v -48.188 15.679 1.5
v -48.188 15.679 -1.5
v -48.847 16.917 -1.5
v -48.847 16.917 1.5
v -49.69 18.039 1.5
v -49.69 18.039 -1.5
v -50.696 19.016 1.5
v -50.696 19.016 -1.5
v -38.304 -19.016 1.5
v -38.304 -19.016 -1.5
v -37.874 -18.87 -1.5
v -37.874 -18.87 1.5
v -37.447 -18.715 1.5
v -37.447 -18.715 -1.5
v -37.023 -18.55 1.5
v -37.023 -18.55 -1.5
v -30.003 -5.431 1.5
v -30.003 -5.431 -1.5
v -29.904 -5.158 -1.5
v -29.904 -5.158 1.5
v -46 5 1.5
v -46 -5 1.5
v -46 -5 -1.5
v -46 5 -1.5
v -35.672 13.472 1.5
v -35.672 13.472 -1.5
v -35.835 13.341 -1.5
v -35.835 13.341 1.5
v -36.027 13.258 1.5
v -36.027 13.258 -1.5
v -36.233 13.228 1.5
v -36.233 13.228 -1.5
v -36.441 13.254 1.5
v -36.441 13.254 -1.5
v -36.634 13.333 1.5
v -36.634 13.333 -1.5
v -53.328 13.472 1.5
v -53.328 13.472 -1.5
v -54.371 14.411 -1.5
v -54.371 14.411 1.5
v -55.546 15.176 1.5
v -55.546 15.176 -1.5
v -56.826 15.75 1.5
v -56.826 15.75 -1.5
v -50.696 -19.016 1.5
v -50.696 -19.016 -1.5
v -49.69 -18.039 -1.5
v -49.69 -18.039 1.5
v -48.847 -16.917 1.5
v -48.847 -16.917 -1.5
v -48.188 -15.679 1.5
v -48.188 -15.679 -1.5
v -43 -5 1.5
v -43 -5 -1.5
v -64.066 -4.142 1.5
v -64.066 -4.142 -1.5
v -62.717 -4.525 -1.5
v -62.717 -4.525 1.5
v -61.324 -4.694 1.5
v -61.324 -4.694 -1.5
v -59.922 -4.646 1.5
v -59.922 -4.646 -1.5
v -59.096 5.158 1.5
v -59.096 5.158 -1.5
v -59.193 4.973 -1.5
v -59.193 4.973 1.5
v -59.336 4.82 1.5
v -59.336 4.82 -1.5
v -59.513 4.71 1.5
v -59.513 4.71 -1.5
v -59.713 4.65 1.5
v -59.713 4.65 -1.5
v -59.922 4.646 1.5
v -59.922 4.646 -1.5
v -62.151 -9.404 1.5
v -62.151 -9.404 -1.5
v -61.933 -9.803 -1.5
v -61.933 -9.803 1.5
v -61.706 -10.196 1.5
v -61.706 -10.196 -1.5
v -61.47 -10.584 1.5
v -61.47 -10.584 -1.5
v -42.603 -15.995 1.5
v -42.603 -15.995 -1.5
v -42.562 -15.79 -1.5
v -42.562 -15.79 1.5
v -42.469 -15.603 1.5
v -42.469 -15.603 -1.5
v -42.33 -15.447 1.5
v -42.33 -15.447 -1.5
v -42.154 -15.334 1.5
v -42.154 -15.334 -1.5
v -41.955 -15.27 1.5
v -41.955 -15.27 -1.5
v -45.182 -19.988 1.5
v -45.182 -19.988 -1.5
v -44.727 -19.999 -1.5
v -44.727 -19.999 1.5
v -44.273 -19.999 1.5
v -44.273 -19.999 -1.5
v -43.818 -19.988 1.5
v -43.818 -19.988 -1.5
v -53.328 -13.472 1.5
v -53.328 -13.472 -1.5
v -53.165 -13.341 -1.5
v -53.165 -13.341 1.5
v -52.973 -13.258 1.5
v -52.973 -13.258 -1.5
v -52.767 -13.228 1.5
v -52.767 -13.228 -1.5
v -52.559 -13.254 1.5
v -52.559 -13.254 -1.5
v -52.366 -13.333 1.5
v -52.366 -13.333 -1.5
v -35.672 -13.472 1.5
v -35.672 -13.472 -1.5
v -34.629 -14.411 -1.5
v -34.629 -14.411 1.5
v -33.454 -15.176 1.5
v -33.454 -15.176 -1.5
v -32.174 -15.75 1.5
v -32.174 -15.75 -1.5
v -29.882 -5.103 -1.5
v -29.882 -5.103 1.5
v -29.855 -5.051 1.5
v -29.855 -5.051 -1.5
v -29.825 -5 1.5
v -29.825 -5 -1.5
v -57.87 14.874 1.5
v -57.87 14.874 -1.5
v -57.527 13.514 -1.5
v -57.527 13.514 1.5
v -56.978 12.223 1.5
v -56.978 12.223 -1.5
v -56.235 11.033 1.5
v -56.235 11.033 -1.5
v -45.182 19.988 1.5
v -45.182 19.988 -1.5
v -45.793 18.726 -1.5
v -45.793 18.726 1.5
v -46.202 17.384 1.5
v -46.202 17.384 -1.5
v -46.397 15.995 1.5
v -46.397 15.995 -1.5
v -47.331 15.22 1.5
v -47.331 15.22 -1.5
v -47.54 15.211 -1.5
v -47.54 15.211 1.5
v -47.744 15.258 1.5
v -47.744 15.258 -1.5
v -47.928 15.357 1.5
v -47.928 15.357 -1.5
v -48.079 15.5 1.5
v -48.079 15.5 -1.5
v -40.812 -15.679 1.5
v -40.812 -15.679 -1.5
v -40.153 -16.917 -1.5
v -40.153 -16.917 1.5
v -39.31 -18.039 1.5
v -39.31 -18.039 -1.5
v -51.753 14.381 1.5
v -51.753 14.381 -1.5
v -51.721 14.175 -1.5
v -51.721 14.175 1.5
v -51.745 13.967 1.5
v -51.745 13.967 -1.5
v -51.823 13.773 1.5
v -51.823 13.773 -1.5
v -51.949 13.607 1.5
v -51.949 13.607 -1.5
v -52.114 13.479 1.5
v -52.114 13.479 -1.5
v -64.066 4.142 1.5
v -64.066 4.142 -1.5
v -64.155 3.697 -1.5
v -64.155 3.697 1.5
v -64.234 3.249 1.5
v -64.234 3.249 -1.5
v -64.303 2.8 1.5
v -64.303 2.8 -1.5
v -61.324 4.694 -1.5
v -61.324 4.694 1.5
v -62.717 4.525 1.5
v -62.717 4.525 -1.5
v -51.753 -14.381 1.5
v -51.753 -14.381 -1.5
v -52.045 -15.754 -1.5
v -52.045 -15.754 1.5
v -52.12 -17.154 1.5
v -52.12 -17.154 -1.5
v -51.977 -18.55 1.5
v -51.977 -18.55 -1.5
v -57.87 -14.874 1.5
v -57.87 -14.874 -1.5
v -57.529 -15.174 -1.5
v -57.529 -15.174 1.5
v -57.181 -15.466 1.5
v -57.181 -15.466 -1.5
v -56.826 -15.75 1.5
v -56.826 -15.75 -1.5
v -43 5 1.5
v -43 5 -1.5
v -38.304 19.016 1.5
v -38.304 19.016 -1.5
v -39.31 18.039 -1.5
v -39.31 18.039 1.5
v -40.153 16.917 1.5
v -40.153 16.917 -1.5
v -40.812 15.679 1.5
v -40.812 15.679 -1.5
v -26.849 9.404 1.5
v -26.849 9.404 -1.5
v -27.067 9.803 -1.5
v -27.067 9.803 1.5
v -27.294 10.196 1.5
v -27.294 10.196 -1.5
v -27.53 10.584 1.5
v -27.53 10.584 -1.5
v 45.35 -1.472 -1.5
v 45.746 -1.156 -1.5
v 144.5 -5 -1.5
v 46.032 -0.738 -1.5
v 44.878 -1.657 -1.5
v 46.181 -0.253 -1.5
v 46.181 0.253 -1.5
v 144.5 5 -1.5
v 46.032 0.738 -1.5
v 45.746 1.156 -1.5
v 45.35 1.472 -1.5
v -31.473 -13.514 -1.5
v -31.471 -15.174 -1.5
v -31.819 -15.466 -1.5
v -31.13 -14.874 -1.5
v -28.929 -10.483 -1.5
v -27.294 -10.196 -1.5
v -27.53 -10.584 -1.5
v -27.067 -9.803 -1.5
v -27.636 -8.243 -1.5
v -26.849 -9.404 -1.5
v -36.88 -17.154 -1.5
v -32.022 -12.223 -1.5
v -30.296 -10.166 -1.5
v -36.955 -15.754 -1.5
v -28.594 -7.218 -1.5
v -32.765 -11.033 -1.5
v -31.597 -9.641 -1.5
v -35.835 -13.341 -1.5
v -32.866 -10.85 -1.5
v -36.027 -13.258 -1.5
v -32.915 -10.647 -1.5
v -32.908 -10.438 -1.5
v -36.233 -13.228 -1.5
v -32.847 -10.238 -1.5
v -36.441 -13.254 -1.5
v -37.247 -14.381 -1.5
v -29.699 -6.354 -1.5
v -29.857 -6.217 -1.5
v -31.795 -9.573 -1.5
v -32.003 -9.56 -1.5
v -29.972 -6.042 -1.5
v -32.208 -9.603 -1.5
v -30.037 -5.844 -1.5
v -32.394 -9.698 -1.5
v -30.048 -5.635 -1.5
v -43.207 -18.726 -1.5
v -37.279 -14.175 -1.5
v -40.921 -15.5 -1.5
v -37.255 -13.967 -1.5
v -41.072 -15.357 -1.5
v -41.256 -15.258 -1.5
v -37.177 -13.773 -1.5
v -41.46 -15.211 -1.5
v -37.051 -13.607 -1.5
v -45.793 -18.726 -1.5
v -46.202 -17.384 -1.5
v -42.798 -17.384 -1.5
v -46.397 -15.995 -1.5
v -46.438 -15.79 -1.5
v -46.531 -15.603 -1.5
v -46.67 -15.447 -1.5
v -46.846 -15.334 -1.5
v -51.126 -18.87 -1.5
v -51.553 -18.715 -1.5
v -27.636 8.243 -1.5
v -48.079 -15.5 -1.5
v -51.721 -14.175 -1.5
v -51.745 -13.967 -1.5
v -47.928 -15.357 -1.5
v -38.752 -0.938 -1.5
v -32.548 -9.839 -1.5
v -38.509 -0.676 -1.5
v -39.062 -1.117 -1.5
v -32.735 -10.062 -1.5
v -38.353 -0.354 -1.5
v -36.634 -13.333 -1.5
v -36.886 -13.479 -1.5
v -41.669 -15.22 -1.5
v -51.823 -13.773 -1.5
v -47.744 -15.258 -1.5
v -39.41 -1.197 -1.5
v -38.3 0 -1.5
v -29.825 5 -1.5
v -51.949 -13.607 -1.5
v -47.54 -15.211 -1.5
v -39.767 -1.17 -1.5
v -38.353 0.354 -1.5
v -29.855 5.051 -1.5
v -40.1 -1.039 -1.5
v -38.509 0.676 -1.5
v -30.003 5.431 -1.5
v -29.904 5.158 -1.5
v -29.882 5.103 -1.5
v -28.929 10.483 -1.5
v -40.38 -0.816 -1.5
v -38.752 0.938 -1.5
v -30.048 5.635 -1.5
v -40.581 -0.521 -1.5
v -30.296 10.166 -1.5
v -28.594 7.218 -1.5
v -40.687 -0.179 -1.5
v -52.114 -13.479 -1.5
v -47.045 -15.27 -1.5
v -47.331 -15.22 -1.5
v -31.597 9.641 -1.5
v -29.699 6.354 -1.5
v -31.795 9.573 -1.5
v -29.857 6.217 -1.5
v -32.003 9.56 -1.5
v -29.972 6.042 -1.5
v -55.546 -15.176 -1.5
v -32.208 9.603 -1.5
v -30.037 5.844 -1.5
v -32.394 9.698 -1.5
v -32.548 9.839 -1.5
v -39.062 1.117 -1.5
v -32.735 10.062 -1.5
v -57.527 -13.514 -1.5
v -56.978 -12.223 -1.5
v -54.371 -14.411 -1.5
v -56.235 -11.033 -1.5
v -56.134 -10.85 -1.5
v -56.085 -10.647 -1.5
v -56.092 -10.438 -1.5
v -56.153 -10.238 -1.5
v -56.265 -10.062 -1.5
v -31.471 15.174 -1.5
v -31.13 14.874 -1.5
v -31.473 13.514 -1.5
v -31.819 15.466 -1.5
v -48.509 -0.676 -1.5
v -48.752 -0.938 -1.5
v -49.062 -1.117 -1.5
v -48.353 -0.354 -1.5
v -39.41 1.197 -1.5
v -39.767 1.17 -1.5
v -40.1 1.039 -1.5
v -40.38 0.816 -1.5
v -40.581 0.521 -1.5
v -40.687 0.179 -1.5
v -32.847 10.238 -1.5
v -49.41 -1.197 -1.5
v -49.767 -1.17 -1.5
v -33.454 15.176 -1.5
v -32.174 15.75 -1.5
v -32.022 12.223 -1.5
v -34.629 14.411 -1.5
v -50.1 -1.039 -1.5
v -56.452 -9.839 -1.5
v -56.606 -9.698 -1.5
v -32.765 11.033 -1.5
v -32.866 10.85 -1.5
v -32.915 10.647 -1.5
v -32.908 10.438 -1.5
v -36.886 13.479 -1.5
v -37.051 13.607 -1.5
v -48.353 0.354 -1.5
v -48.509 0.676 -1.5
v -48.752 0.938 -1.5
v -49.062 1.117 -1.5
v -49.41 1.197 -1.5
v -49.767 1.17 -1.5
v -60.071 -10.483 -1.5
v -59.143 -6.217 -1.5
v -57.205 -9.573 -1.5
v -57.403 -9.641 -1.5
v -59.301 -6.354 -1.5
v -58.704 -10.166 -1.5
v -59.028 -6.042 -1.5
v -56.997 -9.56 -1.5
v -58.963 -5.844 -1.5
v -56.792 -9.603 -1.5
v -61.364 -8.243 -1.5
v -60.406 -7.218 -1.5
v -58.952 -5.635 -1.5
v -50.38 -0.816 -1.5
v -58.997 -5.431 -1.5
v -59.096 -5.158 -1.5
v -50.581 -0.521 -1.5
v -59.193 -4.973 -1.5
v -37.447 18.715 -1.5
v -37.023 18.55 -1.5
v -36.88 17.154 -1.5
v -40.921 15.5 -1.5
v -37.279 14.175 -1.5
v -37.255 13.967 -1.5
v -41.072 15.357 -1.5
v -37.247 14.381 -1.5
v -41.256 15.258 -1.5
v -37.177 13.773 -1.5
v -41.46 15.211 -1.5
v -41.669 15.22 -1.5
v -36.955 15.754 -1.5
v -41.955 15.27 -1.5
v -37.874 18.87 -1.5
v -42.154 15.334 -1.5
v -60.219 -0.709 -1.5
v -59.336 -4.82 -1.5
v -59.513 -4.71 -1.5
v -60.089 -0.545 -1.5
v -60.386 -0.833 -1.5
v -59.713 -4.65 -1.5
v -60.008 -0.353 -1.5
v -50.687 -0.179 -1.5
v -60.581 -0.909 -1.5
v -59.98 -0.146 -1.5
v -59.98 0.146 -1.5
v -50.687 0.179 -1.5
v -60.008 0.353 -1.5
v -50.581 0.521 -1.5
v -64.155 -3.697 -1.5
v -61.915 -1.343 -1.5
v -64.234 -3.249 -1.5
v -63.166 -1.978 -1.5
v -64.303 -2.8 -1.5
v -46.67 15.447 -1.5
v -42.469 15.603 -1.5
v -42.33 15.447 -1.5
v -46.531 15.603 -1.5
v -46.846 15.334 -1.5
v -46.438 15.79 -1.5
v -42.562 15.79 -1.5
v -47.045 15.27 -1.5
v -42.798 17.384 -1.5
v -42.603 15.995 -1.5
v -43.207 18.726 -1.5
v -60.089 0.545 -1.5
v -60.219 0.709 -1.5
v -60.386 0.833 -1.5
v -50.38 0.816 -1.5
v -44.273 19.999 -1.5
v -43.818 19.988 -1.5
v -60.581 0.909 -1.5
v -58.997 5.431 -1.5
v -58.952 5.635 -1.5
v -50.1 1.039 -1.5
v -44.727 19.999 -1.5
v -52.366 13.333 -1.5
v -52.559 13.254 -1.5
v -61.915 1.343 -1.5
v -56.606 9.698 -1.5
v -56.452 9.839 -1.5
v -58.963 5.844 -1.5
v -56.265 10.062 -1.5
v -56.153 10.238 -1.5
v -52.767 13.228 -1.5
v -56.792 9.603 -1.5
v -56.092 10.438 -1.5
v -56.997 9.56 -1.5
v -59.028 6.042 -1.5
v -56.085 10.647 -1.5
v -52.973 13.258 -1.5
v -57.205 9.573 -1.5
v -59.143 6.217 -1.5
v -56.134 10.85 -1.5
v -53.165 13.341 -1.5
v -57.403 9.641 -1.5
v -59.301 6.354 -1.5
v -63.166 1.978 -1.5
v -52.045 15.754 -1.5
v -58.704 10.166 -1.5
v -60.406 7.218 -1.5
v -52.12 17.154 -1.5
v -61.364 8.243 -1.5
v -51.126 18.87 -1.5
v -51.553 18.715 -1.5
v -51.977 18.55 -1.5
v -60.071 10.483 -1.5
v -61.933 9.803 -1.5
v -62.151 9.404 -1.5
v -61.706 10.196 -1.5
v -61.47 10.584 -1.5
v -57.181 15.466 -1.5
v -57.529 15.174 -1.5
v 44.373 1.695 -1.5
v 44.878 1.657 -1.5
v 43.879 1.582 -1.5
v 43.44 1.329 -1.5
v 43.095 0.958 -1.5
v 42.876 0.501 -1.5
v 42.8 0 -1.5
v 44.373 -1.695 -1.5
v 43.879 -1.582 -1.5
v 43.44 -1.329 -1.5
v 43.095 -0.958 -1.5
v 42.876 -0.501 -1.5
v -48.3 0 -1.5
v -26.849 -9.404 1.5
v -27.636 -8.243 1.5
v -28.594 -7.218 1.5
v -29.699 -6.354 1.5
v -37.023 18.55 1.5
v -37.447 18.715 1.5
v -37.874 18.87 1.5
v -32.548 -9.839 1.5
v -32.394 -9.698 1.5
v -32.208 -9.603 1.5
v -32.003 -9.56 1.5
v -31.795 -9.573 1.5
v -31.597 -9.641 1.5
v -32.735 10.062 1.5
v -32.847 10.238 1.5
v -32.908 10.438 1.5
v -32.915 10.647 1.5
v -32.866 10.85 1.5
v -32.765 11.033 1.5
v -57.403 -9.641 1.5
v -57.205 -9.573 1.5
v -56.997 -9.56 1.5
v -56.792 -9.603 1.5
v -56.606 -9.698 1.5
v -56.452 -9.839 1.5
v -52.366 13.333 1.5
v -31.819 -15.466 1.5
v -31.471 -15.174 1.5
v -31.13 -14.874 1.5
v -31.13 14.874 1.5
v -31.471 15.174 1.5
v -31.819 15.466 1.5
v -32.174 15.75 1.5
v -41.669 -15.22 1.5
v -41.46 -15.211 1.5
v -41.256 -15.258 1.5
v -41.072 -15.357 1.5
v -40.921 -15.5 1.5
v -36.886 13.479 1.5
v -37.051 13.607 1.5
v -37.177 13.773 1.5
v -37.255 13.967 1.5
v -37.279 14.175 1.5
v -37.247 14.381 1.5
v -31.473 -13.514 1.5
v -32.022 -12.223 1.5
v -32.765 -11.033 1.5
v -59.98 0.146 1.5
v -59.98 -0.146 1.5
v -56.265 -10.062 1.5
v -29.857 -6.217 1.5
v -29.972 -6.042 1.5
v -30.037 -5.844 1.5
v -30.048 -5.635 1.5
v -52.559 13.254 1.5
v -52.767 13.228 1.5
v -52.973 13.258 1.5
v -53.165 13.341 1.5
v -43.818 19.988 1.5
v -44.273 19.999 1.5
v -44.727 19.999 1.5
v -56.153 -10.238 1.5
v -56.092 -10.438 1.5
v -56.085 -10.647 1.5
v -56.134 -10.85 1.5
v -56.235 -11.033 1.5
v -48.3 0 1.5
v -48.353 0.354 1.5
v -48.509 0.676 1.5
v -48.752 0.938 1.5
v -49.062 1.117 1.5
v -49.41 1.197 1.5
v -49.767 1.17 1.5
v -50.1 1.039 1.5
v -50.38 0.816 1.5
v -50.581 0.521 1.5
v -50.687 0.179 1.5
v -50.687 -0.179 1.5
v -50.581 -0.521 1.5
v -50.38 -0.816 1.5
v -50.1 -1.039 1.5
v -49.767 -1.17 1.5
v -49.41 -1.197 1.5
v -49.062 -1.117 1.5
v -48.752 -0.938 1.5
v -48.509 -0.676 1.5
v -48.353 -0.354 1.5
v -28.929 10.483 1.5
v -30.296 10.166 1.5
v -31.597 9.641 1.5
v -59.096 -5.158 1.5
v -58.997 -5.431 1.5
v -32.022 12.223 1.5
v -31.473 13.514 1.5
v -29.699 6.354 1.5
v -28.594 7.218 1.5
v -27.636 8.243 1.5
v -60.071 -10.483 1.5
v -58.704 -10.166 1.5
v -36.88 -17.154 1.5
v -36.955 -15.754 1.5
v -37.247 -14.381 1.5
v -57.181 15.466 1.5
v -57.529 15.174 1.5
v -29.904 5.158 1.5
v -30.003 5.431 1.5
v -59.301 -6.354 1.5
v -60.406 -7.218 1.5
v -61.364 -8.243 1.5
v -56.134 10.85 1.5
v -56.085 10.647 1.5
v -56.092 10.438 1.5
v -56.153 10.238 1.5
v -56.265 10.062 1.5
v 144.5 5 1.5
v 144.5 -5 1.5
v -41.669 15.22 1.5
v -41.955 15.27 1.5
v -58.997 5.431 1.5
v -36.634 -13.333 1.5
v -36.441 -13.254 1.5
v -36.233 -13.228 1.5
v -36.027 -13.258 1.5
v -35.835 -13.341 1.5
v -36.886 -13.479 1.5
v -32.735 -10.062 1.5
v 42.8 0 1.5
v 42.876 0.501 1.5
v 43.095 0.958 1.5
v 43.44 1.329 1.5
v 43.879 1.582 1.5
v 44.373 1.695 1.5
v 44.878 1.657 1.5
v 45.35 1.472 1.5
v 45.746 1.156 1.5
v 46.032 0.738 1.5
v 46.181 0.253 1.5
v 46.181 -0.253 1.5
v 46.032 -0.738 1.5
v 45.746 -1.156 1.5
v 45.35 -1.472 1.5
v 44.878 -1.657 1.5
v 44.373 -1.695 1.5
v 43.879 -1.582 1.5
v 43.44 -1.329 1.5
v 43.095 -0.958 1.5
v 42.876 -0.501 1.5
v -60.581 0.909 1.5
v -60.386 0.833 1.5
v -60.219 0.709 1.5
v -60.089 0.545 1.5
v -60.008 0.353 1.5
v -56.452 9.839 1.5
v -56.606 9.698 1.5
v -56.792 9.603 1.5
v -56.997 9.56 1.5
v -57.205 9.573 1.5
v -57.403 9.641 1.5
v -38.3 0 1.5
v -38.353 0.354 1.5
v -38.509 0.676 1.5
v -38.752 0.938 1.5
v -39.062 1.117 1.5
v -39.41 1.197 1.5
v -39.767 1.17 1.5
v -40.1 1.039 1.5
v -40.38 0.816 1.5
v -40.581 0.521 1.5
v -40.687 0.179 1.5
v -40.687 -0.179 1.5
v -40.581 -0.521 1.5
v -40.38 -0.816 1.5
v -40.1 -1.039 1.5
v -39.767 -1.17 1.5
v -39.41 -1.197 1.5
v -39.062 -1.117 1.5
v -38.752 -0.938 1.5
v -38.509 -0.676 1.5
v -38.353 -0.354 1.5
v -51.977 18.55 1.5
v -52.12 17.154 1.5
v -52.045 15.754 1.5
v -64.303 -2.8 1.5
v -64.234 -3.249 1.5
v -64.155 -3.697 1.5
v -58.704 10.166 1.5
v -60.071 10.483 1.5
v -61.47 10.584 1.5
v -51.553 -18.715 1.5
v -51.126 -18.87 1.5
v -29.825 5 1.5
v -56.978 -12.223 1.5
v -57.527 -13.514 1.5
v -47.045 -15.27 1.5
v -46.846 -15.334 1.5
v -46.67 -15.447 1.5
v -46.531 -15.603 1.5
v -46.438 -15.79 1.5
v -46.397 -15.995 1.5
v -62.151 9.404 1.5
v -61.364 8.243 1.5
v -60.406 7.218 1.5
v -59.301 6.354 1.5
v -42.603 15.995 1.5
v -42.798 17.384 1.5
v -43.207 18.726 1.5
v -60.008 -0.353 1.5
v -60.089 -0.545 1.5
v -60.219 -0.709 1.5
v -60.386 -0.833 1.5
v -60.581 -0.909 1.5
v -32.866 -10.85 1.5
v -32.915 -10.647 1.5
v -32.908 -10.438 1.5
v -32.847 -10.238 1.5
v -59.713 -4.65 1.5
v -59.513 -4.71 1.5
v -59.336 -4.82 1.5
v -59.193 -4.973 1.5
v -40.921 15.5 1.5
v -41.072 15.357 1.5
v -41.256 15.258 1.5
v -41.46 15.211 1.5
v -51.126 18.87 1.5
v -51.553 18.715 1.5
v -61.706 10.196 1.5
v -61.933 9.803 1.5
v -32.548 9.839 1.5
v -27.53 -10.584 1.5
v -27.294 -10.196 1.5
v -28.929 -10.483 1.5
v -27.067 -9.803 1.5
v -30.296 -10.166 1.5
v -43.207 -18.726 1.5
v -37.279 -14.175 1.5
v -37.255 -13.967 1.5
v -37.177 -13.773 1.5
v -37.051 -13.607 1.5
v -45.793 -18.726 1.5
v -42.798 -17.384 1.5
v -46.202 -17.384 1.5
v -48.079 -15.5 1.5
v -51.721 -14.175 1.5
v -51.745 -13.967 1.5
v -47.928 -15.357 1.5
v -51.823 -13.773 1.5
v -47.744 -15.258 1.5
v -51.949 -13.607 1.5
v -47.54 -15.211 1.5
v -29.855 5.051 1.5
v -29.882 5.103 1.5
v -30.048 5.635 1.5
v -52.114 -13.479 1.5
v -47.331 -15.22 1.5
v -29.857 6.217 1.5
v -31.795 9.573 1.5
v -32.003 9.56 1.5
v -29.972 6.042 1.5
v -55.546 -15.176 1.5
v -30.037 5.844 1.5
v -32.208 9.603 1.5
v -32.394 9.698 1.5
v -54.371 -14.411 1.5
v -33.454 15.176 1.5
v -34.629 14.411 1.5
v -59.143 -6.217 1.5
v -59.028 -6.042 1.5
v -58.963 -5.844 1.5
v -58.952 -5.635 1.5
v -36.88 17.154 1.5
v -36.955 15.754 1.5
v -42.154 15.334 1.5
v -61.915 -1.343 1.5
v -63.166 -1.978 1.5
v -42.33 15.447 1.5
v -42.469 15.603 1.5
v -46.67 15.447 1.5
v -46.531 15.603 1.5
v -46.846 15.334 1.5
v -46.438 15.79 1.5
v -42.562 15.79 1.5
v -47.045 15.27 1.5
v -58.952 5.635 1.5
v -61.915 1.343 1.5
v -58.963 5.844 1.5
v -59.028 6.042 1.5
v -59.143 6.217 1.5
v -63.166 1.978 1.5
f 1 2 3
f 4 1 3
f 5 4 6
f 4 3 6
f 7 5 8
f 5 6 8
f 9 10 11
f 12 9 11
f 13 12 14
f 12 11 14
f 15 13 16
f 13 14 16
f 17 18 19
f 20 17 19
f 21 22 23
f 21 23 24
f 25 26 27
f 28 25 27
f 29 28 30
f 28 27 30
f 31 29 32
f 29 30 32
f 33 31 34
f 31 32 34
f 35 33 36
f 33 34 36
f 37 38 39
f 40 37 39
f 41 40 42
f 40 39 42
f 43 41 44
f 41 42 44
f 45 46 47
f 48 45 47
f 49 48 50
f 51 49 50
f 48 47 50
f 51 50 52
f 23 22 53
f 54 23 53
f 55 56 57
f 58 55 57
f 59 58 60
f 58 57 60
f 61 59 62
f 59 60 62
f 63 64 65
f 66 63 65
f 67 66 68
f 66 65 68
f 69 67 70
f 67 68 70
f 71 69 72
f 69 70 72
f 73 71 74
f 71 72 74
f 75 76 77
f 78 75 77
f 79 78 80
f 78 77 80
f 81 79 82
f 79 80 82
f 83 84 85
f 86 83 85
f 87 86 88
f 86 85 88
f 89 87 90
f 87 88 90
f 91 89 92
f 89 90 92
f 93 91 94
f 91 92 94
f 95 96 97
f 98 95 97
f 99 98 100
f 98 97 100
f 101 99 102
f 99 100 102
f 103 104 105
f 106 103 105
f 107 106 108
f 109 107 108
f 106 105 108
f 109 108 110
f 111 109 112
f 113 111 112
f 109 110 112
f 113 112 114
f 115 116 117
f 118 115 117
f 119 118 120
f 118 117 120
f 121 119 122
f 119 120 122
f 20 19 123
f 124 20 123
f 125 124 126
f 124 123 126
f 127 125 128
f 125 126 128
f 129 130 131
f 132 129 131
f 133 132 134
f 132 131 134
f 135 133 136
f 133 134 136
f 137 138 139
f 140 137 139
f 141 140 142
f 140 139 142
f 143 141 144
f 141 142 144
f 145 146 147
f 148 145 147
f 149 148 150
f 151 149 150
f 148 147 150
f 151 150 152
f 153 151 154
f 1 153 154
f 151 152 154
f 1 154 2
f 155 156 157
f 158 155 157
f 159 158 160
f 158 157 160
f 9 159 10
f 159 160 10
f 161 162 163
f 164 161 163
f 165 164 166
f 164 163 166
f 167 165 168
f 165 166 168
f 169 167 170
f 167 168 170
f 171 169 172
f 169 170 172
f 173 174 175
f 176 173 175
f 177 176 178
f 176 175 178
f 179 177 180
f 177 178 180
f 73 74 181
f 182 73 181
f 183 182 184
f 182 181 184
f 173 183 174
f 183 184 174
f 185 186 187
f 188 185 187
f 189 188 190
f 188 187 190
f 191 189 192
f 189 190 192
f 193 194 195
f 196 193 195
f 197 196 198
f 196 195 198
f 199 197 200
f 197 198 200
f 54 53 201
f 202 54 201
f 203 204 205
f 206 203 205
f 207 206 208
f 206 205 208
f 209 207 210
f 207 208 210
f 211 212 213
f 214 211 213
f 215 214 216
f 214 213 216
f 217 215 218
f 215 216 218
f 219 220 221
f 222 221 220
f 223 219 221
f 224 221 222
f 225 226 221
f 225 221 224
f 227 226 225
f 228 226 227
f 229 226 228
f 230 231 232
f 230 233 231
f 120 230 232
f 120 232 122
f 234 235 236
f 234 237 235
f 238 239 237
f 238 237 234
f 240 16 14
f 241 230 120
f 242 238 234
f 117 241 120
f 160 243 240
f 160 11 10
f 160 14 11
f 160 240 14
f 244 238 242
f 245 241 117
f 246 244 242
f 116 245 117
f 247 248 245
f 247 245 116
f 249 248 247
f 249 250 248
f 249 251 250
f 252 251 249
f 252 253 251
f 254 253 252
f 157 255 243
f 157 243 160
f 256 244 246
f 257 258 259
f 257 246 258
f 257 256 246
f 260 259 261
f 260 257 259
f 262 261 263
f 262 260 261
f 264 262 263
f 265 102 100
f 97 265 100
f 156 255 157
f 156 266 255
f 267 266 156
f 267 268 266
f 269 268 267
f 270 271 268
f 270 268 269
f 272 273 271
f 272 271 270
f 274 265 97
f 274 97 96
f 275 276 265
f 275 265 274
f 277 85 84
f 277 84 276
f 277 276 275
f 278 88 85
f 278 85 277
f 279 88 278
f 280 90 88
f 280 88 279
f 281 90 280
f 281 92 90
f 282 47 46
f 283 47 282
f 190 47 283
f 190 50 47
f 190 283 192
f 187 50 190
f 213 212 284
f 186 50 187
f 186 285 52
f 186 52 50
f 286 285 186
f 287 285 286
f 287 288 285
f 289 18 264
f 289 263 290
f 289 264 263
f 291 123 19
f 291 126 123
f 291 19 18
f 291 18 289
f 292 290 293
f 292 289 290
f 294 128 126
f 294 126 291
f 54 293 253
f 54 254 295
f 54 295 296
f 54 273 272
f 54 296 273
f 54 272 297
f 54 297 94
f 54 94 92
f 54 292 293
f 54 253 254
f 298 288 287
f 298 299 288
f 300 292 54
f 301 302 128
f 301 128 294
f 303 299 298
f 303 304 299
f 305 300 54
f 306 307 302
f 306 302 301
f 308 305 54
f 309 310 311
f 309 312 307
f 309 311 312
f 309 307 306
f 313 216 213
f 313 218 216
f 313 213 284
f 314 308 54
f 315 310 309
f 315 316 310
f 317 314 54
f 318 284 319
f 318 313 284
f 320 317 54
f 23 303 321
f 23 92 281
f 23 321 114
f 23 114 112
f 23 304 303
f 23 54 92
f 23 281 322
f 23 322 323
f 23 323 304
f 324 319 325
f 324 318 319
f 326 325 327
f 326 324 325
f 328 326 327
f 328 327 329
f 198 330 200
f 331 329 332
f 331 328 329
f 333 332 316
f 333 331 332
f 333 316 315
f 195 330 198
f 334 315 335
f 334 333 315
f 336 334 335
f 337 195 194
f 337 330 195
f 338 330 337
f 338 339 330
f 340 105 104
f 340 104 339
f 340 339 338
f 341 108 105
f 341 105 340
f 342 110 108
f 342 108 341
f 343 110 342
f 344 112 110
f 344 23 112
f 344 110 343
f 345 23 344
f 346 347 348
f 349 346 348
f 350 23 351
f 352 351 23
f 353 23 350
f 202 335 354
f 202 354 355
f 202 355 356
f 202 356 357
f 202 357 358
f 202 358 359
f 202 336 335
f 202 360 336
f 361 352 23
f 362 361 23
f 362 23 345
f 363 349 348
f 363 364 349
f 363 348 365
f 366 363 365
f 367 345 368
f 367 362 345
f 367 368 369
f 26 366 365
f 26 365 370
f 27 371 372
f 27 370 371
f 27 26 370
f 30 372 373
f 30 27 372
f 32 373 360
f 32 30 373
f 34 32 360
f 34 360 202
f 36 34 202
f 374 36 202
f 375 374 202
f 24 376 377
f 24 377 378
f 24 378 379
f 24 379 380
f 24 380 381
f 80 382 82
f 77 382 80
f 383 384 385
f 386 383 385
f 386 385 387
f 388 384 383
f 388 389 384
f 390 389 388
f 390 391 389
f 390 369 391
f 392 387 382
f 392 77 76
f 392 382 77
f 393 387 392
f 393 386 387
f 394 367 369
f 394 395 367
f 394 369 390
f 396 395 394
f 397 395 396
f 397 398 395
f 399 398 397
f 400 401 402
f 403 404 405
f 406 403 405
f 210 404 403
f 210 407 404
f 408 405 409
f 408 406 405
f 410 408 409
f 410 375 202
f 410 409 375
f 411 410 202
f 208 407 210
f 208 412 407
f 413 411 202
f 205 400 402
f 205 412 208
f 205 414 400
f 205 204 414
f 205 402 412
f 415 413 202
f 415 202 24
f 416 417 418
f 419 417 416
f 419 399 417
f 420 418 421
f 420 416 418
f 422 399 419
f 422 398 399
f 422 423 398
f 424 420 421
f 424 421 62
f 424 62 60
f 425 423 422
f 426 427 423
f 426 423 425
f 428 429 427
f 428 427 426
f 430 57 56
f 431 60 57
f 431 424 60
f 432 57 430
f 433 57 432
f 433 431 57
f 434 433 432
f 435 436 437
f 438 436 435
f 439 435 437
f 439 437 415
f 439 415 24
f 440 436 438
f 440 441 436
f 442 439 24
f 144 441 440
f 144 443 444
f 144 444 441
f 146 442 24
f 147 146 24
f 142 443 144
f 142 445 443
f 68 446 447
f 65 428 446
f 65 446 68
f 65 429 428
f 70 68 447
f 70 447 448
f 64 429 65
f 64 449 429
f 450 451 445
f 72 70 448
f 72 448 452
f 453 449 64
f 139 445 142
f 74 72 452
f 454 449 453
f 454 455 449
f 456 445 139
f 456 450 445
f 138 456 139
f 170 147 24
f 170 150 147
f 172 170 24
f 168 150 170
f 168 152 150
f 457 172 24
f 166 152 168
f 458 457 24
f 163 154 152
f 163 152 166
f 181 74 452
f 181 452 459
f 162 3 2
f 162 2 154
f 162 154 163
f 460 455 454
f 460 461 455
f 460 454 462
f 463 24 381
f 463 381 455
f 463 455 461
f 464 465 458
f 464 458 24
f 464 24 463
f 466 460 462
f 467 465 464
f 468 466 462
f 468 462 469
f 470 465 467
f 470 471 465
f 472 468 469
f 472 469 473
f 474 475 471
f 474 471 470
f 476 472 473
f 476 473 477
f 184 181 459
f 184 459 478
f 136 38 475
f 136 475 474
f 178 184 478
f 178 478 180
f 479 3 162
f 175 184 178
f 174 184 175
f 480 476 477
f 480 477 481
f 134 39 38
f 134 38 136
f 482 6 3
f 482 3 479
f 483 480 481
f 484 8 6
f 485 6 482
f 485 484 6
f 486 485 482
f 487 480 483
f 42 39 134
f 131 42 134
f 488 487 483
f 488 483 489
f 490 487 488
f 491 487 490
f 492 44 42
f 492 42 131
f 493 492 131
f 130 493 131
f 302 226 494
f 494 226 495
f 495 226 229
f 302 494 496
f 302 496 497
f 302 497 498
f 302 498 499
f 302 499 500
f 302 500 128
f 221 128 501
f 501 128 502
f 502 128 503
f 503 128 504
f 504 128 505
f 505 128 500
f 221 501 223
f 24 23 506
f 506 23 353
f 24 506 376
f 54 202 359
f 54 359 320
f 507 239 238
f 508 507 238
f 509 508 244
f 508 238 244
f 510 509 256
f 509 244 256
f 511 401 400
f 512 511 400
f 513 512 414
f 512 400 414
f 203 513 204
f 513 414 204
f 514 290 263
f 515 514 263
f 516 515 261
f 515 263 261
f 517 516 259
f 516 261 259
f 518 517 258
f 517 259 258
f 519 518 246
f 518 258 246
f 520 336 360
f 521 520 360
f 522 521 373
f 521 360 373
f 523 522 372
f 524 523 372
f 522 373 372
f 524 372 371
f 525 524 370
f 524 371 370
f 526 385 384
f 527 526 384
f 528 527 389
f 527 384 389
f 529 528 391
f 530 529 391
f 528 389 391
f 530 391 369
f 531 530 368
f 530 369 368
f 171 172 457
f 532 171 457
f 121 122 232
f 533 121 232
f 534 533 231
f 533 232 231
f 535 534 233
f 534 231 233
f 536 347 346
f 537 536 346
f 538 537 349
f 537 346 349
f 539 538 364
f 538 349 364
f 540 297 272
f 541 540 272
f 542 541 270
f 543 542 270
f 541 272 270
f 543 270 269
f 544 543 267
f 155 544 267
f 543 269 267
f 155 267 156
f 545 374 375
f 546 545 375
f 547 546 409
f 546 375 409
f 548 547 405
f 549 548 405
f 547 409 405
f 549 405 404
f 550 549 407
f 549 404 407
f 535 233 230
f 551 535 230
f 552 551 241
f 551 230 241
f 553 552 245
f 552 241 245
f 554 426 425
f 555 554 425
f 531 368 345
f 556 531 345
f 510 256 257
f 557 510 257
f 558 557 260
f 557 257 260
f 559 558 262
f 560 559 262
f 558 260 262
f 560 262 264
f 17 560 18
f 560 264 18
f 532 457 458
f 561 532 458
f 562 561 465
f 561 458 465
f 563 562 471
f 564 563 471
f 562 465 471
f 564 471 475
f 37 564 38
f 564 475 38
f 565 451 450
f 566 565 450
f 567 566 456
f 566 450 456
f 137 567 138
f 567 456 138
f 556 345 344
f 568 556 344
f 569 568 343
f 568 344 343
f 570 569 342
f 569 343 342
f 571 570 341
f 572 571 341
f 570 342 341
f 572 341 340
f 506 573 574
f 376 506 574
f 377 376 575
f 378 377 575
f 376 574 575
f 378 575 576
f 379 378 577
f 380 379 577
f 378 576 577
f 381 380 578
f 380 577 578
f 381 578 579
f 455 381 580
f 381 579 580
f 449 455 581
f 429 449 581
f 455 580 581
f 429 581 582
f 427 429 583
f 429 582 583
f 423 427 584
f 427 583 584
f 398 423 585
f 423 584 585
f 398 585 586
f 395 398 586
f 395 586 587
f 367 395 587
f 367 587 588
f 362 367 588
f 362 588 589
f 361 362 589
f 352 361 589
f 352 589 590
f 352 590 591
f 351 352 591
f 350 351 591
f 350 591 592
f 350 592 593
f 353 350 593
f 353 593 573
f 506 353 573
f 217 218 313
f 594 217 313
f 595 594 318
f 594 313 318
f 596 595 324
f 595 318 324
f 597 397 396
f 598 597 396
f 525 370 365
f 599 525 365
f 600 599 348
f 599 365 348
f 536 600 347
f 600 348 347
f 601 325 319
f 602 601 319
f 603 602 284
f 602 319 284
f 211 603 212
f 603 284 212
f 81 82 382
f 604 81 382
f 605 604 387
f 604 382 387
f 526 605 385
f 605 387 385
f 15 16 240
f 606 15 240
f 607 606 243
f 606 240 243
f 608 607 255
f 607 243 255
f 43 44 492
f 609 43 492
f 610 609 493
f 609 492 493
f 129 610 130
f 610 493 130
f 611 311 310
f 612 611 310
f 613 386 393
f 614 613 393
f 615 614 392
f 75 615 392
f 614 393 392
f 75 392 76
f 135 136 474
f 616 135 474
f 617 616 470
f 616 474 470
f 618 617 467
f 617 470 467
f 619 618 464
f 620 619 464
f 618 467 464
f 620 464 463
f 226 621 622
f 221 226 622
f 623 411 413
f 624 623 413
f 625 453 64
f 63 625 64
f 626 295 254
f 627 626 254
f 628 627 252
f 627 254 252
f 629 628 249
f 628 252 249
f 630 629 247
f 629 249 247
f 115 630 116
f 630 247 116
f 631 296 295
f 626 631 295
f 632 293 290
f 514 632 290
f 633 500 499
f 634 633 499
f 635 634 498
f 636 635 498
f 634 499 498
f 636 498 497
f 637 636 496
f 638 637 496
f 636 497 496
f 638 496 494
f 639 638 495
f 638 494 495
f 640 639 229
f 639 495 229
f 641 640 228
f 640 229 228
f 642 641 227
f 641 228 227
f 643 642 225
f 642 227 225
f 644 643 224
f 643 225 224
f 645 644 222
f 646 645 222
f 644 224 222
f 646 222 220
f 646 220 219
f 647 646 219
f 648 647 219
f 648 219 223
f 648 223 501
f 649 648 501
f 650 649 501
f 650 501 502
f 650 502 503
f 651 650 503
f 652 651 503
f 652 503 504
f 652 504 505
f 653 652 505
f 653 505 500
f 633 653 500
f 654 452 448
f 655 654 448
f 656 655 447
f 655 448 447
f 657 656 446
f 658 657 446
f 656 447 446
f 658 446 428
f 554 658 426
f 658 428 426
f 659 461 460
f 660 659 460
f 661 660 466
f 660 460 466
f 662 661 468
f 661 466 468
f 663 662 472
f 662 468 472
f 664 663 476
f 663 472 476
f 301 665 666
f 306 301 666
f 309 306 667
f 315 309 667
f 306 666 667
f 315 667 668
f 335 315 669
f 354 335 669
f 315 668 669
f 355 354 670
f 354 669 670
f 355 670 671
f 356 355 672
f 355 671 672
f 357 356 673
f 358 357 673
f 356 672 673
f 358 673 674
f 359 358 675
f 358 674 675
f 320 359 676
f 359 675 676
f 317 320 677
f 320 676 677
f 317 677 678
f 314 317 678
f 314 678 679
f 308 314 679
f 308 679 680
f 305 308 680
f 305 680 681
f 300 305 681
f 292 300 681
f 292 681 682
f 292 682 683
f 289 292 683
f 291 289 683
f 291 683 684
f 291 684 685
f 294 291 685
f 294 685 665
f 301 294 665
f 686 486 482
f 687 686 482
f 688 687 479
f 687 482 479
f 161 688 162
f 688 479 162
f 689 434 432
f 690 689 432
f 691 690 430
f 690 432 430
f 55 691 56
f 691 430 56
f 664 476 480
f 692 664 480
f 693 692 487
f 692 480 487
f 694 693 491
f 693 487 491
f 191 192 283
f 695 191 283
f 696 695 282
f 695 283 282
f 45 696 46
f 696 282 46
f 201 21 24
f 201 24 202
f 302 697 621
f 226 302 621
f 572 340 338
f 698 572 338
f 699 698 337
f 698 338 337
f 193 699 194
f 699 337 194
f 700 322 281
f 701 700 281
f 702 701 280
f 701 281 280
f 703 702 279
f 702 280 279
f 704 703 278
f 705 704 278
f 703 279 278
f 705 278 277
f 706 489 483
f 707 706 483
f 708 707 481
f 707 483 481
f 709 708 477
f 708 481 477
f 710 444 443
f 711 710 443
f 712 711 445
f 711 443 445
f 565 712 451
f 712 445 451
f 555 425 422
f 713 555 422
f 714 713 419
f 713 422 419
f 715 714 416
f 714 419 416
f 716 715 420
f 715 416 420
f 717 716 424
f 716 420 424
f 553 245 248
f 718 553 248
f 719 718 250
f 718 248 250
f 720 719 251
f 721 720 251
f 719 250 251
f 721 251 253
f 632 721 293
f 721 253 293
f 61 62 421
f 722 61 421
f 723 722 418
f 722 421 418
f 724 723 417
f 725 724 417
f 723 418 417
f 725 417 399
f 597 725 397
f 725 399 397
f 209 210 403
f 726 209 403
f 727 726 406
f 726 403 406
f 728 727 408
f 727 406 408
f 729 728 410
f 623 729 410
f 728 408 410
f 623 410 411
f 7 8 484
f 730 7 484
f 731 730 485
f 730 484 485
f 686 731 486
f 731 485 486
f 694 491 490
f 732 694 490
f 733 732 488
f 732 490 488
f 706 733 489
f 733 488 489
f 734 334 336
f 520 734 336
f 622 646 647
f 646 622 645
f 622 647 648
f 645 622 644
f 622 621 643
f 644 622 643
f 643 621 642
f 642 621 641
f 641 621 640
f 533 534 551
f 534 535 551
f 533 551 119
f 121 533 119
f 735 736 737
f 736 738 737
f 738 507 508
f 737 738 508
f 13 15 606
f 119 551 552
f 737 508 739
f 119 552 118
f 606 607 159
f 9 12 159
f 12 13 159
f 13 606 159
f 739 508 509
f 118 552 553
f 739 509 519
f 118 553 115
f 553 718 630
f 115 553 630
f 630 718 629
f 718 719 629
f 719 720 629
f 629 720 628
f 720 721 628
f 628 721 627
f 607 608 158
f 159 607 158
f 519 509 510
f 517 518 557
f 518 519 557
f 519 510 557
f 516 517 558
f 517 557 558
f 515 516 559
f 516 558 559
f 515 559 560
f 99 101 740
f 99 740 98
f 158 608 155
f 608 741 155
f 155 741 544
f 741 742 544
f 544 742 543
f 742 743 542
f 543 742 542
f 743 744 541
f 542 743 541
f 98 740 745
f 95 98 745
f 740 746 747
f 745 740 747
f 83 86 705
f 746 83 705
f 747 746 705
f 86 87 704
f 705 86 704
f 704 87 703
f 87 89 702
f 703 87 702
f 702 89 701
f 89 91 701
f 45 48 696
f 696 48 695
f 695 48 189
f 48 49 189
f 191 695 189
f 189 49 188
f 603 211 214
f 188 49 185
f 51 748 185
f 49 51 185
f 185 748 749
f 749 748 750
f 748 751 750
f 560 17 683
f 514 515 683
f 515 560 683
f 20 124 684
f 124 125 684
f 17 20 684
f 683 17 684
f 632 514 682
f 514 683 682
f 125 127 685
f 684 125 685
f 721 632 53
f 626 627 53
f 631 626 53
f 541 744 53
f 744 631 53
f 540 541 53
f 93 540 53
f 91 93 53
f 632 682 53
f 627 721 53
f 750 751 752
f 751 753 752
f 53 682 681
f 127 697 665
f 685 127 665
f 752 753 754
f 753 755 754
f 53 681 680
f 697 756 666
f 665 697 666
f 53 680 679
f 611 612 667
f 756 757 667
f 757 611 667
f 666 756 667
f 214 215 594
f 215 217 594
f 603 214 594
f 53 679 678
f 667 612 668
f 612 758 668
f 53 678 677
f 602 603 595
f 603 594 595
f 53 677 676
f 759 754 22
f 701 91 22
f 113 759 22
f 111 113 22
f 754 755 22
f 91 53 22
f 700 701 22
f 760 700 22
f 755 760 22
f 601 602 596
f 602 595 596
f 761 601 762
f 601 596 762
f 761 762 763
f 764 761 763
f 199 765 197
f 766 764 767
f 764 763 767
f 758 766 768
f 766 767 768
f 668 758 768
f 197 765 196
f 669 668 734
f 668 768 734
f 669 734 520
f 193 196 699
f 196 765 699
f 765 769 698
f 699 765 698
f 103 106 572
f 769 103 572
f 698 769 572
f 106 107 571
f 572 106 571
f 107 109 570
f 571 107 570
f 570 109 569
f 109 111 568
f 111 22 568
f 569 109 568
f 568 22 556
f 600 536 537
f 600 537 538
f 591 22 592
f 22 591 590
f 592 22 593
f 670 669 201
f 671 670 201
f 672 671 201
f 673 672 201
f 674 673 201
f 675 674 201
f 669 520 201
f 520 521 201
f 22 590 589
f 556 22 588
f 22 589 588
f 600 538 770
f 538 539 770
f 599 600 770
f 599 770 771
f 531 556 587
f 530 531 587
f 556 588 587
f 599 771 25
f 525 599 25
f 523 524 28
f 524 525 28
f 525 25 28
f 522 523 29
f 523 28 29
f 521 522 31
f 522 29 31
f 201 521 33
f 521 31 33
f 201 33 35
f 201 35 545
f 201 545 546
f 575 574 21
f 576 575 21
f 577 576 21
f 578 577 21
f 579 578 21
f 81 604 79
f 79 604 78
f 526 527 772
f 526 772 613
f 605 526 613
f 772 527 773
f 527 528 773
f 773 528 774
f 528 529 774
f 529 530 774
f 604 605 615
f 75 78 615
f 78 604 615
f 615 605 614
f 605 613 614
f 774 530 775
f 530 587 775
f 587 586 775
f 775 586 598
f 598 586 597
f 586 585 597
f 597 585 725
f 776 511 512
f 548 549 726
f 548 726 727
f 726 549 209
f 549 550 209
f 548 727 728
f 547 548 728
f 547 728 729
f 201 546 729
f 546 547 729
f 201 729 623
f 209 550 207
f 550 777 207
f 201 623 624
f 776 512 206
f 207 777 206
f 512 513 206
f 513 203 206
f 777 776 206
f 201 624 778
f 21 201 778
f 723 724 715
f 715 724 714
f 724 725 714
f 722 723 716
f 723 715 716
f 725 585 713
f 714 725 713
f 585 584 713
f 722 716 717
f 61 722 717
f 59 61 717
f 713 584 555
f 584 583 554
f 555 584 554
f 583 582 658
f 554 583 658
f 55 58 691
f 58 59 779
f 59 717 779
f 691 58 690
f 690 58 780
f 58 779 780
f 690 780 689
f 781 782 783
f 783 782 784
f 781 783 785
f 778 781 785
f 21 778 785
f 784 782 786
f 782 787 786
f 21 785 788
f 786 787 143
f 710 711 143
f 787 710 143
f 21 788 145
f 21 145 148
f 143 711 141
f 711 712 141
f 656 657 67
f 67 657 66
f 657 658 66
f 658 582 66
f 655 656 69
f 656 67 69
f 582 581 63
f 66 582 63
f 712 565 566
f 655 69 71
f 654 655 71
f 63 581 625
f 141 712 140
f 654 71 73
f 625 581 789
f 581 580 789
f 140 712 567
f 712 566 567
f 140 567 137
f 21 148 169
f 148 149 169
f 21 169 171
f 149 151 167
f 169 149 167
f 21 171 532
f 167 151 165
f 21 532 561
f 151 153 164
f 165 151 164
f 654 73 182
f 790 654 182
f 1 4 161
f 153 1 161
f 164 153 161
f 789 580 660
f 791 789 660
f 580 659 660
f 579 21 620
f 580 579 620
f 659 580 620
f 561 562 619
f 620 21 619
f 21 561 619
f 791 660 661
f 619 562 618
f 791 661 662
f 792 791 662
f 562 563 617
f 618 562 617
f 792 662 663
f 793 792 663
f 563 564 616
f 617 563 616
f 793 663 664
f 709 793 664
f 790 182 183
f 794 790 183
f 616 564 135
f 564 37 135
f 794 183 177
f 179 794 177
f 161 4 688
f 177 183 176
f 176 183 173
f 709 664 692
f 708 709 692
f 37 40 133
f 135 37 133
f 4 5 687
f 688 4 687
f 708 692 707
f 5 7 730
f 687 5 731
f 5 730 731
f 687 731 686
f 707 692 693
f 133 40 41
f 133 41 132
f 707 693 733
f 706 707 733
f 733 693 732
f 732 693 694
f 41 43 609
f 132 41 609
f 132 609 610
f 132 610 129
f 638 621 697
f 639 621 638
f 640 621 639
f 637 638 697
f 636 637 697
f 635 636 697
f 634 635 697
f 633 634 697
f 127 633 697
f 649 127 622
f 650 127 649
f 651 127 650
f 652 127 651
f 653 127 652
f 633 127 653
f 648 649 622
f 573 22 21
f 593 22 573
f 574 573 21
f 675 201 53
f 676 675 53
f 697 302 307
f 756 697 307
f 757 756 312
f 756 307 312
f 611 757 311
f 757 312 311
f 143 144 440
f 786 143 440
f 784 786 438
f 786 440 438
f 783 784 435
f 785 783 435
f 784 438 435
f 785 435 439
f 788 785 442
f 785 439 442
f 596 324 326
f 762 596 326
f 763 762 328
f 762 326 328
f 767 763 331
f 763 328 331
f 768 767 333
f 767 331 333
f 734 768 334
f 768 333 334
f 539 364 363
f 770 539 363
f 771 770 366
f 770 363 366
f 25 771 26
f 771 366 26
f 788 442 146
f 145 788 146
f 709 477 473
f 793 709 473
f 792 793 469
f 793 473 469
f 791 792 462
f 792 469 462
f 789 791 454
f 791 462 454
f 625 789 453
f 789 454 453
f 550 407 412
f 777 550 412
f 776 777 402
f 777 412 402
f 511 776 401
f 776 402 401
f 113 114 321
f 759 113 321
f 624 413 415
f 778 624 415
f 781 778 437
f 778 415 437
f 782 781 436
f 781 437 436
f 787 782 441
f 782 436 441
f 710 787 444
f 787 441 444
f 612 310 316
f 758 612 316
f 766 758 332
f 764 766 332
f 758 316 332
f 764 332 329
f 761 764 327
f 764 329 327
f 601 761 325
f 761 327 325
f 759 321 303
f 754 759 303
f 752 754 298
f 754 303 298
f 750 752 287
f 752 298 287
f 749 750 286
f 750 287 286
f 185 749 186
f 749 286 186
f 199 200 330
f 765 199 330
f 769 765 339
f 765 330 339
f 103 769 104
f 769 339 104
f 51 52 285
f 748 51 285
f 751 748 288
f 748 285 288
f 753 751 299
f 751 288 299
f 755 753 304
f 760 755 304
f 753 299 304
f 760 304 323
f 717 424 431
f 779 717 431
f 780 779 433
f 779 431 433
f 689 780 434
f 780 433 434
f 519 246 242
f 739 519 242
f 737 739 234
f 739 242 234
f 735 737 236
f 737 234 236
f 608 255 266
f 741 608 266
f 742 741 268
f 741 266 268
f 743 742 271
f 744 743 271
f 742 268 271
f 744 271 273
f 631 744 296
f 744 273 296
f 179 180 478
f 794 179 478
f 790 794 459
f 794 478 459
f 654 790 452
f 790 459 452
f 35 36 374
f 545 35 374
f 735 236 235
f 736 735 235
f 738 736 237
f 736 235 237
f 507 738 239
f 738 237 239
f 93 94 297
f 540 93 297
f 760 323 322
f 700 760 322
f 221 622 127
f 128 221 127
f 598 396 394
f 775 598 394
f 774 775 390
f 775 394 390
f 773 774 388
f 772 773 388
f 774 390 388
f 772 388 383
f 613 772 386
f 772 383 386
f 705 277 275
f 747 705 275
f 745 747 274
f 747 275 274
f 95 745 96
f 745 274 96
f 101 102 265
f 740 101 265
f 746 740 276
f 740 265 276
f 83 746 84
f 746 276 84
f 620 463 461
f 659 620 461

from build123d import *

# Parameters (mm, degrees)
AUFSATZ_LINEAR_AUSTRAGEN1_DEPTH = 1.5
DURCHGANGSLOCH_F_R_M31_D        = 3.4
AUFSATZ_LINEAR_AUSTRAGEN2_DEPTH = 3
SKIZZE5_W                       = 4
SKIZZE5_H                       = 4
SCHNITT_LINEAR_AUSTRAGEN1_DEPTH = 145.617599206
F_36MM_SPUR_GEAR1_START         = -20
F_36MM_SPUR_GEAR1_DEPTH         = 3
SKIZZE7_W                       = 3
SKIZZE7_H                       = 10
SCHNITT_LINEAR_AUSTRAGEN3_DEPTH = 146.908361659
SKIZZE8_R                       = 1.2
SCHNITT_LINEAR_AUSTRAGEN4_DEPTH = 146.908361659


with BuildPart() as part:
    # Skizze1 → Aufsatz-Linear austragen1 (new, symmetric)
    with BuildSketch(Plane.XY):
        with BuildLine():
            Line((-44.5, 5), (44.5, 5))
            ThreePointArc((44.5, 5), (49.5, 0), (44.5, -5))
            Line((44.5, -5), (-44.5, -5))
            ThreePointArc((-44.5, -5), (-49.5, 0), (-44.5, 5))
        make_face()
    extrude(amount=AUFSATZ_LINEAR_AUSTRAGEN1_DEPTH, both=True)

    # Durchgangsloch für M31 (through all)
    with Locations(Plane.XY.offset(1.5)):
        with Locations((-44.5, 0), (44.5, 0)):
            Hole(DURCHGANGSLOCH_F_R_M31_D / 2)

    # Skizze4 → Aufsatz-Linear austragen2 (add)
    with BuildSketch(Plane.XY.offset(1.5)):
        with BuildLine():
            Line((44.5, 5), (144.5, 5))
            Line((144.5, 5), (144.5, -5))
            Line((144.5, -5), (44.5, -5))
            ThreePointArc((44.5, -5), (49.5, 0), (44.5, 5))
        make_face()
    extrude(amount=-AUFSATZ_LINEAR_AUSTRAGEN2_DEPTH)

    # Skizze5 → Schnitt-Linear austragen1 (cut, through all)
    with BuildSketch(Plane.XY.offset(1.5)):
        with Locations((-44.5, 0)):
            Rectangle(SKIZZE5_W, SKIZZE5_H)
    extrude(amount=-SCHNITT_LINEAR_AUSTRAGEN1_DEPTH, mode=Mode.SUBTRACT)


with BuildPart() as body_2:
    # 36mm_spur_gear1: read off the stored shape, not the designer's step
    # 36mm_spur_gear1 outline → 36mm_spur_gear1 (new body)
    with BuildSketch(Plane.XY.offset(F_36MM_SPUR_GEAR1_START)):
        with BuildLine():
            ThreePointArc((-68.651249783, 18.637616045), (-69.025162545, 20.70563552), (-69.867010124, 22.631202439))
            ThreePointArc((-69.867010124, 22.631202439), (-70.548541939, 22.642817953), (-71.230073753, 22.631202439))
            ThreePointArc((-71.230073753, 22.631202439), (-72.071921332, 20.70563552), (-72.445834093, 18.637616045))
            ThreePointArc((-72.445834093, 18.637616045), (-72.644060056, 18.163145097), (-73.09332879, 17.912997508))
            Line((-73.09332879, 17.912997508), (-73.379933512, 17.862461362))
            ThreePointArc((-73.379933512, 17.862461362), (-73.887663541, 17.94386425), (-74.236213637, 18.321923825))
            ThreePointArc((-74.236213637, 18.321923825), (-75.294881017, 20.13734077), (-76.744541648, 21.658852965))
            ThreePointArc((-76.744541648, 21.658852965), (-77.388944805, 21.436670368), (-78.025402482, 21.192657747))
            ThreePointArc((-78.025402482, 21.192657747), (-78.157897766, 19.095287893), (-77.801956511, 17.024099556))
            ThreePointArc((-77.801956511, 17.024099556), (-77.825949365, 16.510445436), (-78.162568364, 16.121724635))
            Line((-78.162568364, 16.121724635), (-78.414604327, 15.976211604))
            ThreePointArc((-78.414604327, 15.976211604), (-78.919555916, 15.879051399), (-79.376389859, 16.115100039))
            ThreePointArc((-79.376389859, 16.115100039), (-80.992120948, 17.458948377), (-82.874744165, 18.392889021))
            ThreePointArc((-82.874744165, 18.392889021), (-83.404294132, 17.963706815), (-83.918911483, 17.51672861))
            ThreePointArc((-83.918911483, 17.51672861), (-83.326073586, 15.500529579), (-82.283210083, 13.675988261))
            ThreePointArc((-82.283210083, 13.675988261), (-82.130075935, 13.185105236), (-82.313443981, 12.704696689))
            Line((-82.313443981, 12.704696689), (-82.500511927, 12.481757791))
            ThreePointArc((-82.500511927, 12.481757791), (-82.941780462, 12.217753449), (-83.451797337, 12.283320203))
            ThreePointArc((-83.451797337, 12.283320203), (-85.429711119, 12.993511991), (-87.518224777, 13.227234061))
            ThreePointArc((-87.518224777, 13.227234061), (-87.869050014, 12.642817953), (-88.199756591, 12.046786331))
            ThreePointArc((-88.199756591, 12.046786331), (-86.953090513, 10.354941482), (-85.349089492, 8.997113794))
            ThreePointArc((-85.349089492, 8.997113794), (-85.037298579, 8.588209601), (-85.045298779, 8.074057669))
            Line((-85.045298779, 8.074057669), (-85.144835555, 7.800582626))
            ThreePointArc((-85.144835555, 7.800582626), (-85.469197538, 7.401576967), (-85.970881782, 7.288753517))
            ThreePointArc((-85.970881782, 7.288753517), (-88.072412665, 7.279629144), (-90.114911193, 6.784942308))
            ThreePointArc((-90.114911193, 6.784942308), (-90.244696998, 6.115781506), (-90.351604708, 5.442586678))
            ThreePointArc((-90.351604708, 5.442586678), (-88.601476776, 4.279157469), (-86.629804432, 3.55181747))
            ThreePointArc((-86.629804432, 3.55181747), (-86.196963342, 3.274211989), (-86.028630753, 2.788330984))
            Line((-86.028630753, 2.788330984), (-86.028630753, 2.497304922))
            ThreePointArc((-86.028630753, 2.497304922), (-86.196963342, 2.011423916), (-86.629804432, 1.733818435))
            ThreePointArc((-86.629804432, 1.733818435), (-88.601476776, 1.006478436), (-90.351604708, -0.156950773))
            ThreePointArc((-90.351604708, -0.156950773), (-90.244696998, -0.830145601), (-90.114911193, -1.499306403))
            ThreePointArc((-90.114911193, -1.499306403), (-88.072412665, -1.993993239), (-85.970881782, -2.003117612))
            ThreePointArc((-85.970881782, -2.003117612), (-85.469197538, -2.115941062), (-85.144835555, -2.514946721))
            Line((-85.144835555, -2.514946721), (-85.045298779, -2.788421764))
            ThreePointArc((-85.045298779, -2.788421764), (-85.037298579, -3.302573696), (-85.349089492, -3.711477889))
            ThreePointArc((-85.349089492, -3.711477889), (-86.953090513, -5.069305577), (-88.199756591, -6.761150426))
            ThreePointArc((-88.199756591, -6.761150426), (-87.869050014, -7.357182048), (-87.518224777, -7.941598156))
            ThreePointArc((-87.518224777, -7.941598156), (-85.429711119, -7.707876086), (-83.451797337, -6.997684298))
            ThreePointArc((-83.451797337, -6.997684298), (-82.941780462, -6.932117544), (-82.500511927, -7.196121886))
            Line((-82.500511927, -7.196121886), (-82.313443981, -7.419060783))
            ThreePointArc((-82.313443981, -7.419060783), (-82.130075935, -7.89946933), (-82.283210083, -8.390352356))
            ThreePointArc((-82.283210083, -8.390352356), (-83.326073586, -10.214893673), (-83.918911483, -12.231092704))
            ThreePointArc((-83.918911483, -12.231092704), (-83.404294132, -12.67807091), (-82.874744165, -13.107253116))
            ThreePointArc((-82.874744165, -13.107253116), (-80.992120948, -12.173312471), (-79.376389859, -10.829464134))
            ThreePointArc((-79.376389859, -10.829464134), (-78.919555916, -10.593415494), (-78.414604327, -10.690575699))
            Line((-78.414604327, -10.690575699), (-78.162568364, -10.83608873))
            ThreePointArc((-78.162568364, -10.83608873), (-77.825949365, -11.224809531), (-77.801956511, -11.738463651))
            ThreePointArc((-77.801956511, -11.738463651), (-78.157897766, -13.809651988), (-78.025402482, -15.907021842))
            ThreePointArc((-78.025402482, -15.907021842), (-77.388944805, -16.151034463), (-76.744541648, -16.37321706))
            ThreePointArc((-76.744541648, -16.37321706), (-75.294881017, -14.851704865), (-74.236213637, -13.03628792))
            ThreePointArc((-74.236213637, -13.03628792), (-73.887663541, -12.658228345), (-73.379933512, -12.576825457))
            Line((-73.379933512, -12.576825457), (-73.09332879, -12.627361603))
            ThreePointArc((-73.09332879, -12.627361603), (-72.644060056, -12.877509192), (-72.445834093, -13.35198014))
            ThreePointArc((-72.445834093, -13.35198014), (-72.071921332, -15.419999615), (-71.230073753, -17.345566534))
            ThreePointArc((-71.230073753, -17.345566534), (-70.548541939, -17.357182047), (-69.867010124, -17.345566534))
            ThreePointArc((-69.867010124, -17.345566534), (-69.025162545, -15.419999615), (-68.651249783, -13.35198014))
            ThreePointArc((-68.651249783, -13.35198014), (-68.453023821, -12.877509192), (-68.003755086, -12.627361603))
            Line((-68.003755086, -12.627361603), (-67.717150364, -12.576825457))
            ThreePointArc((-67.717150364, -12.576825457), (-67.209420336, -12.658228345), (-66.86087024, -13.03628792))
            ThreePointArc((-66.86087024, -13.03628792), (-65.802202859, -14.851704865), (-64.352542228, -16.37321706))
            ThreePointArc((-64.352542228, -16.37321706), (-63.708139072, -16.151034463), (-63.071681394, -15.907021842))
            ThreePointArc((-63.071681394, -15.907021842), (-62.93918611, -13.809651988), (-63.295127365, -11.738463651))
            ThreePointArc((-63.295127365, -11.738463651), (-63.271134512, -11.224809531), (-62.934515512, -10.83608873))
            Line((-62.934515512, -10.83608873), (-62.682479549, -10.690575699))
            ThreePointArc((-62.682479549, -10.690575699), (-62.17752796, -10.593415494), (-61.720694017, -10.829464134))
            ThreePointArc((-61.720694017, -10.829464134), (-60.104962929, -12.173312471), (-58.222339712, -13.107253116))
            ThreePointArc((-58.222339712, -13.107253116), (-57.692789744, -12.67807091), (-57.178172393, -12.231092704))
            ThreePointArc((-57.178172393, -12.231092704), (-57.77101029, -10.214893673), (-58.813873793, -8.390352356))
            ThreePointArc((-58.813873793, -8.390352356), (-58.967007942, -7.89946933), (-58.783639896, -7.419060783))
            Line((-58.783639896, -7.419060783), (-58.596571949, -7.196121886))
            ThreePointArc((-58.596571949, -7.196121886), (-58.155303414, -6.932117544), (-57.645286539, -6.997684298))
            ThreePointArc((-57.645286539, -6.997684298), (-55.667372757, -7.707876086), (-53.578859099, -7.941598156))
            ThreePointArc((-53.578859099, -7.941598156), (-53.228033862, -7.357182048), (-52.897327285, -6.761150426))
            ThreePointArc((-52.897327285, -6.761150426), (-54.143993364, -5.069305577), (-55.747994385, -3.711477889))
            ThreePointArc((-55.747994385, -3.711477889), (-56.059785297, -3.302573696), (-56.051785097, -2.788421764))
            Line((-56.051785097, -2.788421764), (-55.952248322, -2.514946721))
            ThreePointArc((-55.952248322, -2.514946721), (-55.627886339, -2.115941062), (-55.126202094, -2.003117612))
            ThreePointArc((-55.126202094, -2.003117612), (-53.024671211, -1.993993239), (-50.982172683, -1.499306403))
            ThreePointArc((-50.982172683, -1.499306403), (-50.852386878, -0.830145601), (-50.745479168, -0.156950773))
            ThreePointArc((-50.745479168, -0.156950773), (-52.4956071, 1.006478436), (-54.467279444, 1.733818435))
            ThreePointArc((-54.467279444, 1.733818435), (-54.900120534, 2.011423916), (-55.068453123, 2.497304922))
            Line((-55.068453123, 2.497304922), (-55.068453123, 2.788330984))
            ThreePointArc((-55.068453123, 2.788330984), (-54.900120534, 3.274211989), (-54.467279444, 3.55181747))
            ThreePointArc((-54.467279444, 3.55181747), (-52.4956071, 4.279157469), (-50.745479168, 5.442586678))
            ThreePointArc((-50.745479168, 5.442586678), (-50.852386878, 6.115781506), (-50.982172683, 6.784942308))
            ThreePointArc((-50.982172683, 6.784942308), (-53.024671211, 7.279629144), (-55.126202094, 7.288753517))
            ThreePointArc((-55.126202094, 7.288753517), (-55.627886339, 7.401576967), (-55.952248322, 7.800582626))
            Line((-55.952248322, 7.800582626), (-56.051785097, 8.074057669))
            ThreePointArc((-56.051785097, 8.074057669), (-56.059785297, 8.588209601), (-55.747994385, 8.997113794))
            ThreePointArc((-55.747994385, 8.997113794), (-54.143993364, 10.354941482), (-52.897327285, 12.046786331))
            ThreePointArc((-52.897327285, 12.046786331), (-53.228033862, 12.642817953), (-53.578859099, 13.227234061))
            ThreePointArc((-53.578859099, 13.227234061), (-55.667372757, 12.993511991), (-57.645286539, 12.283320203))
            ThreePointArc((-57.645286539, 12.283320203), (-58.155303414, 12.217753449), (-58.596571949, 12.481757791))
            Line((-58.596571949, 12.481757791), (-58.783639896, 12.704696689))
            ThreePointArc((-58.783639896, 12.704696689), (-58.967007942, 13.185105236), (-58.813873793, 13.675988261))
            ThreePointArc((-58.813873793, 13.675988261), (-57.77101029, 15.500529579), (-57.178172393, 17.51672861))
            ThreePointArc((-57.178172393, 17.51672861), (-57.692789744, 17.963706815), (-58.222339712, 18.392889021))
            ThreePointArc((-58.222339712, 18.392889021), (-60.104962929, 17.458948377), (-61.720694017, 16.115100039))
            ThreePointArc((-61.720694017, 16.115100039), (-62.17752796, 15.879051399), (-62.682479549, 15.976211604))
            Line((-62.682479549, 15.976211604), (-62.934515512, 16.121724635))
            ThreePointArc((-62.934515512, 16.121724635), (-63.271134512, 16.510445436), (-63.295127365, 17.024099556))
            ThreePointArc((-63.295127365, 17.024099556), (-62.93918611, 19.095287893), (-63.071681394, 21.192657747))
            ThreePointArc((-63.071681394, 21.192657747), (-63.708139072, 21.436670368), (-64.352542228, 21.658852965))
            ThreePointArc((-64.352542228, 21.658852965), (-65.802202859, 20.13734077), (-66.86087024, 18.321923825))
            ThreePointArc((-66.86087024, 18.321923825), (-67.209420336, 17.94386425), (-67.717150364, 17.862461362))
            Line((-67.717150364, 17.862461362), (-68.003755086, 17.912997508))
            ThreePointArc((-68.003755086, 17.912997508), (-68.453023821, 18.163145097), (-68.651249783, 18.637616045))
        make_face()
        with BuildLine():
            Line((-70.548541938, 3.642817953), (-70.548541938, 1.642817953))
            ThreePointArc((-70.548541938, 1.642817953), (-71.548541938, 2.642817953), (-70.548541938, 3.642817953))
        make_face(mode=Mode.SUBTRACT)
    extrude(amount=F_36MM_SPUR_GEAR1_DEPTH)


with BuildPart() as body_2_1:
    # Körper-Verschieben/Kopieren6: read off the stored shape, not the designer's step
    # Körper-Verschieben/Kopieren6: moved
    add(body_2.part.moved(Location((26.0485419, -2.642818, 18.5))))

    # Kombinieren2: union part
    add(part.part)

    # Skizze7 → Schnitt-Linear austragen3 (cut, through all)
    with BuildSketch(Plane.XY.offset(1.5)):
        with Locations((-44.5, 0)):
            Rectangle(SKIZZE7_W, SKIZZE7_H)
    extrude(amount=-SCHNITT_LINEAR_AUSTRAGEN3_DEPTH, mode=Mode.SUBTRACT)

    # Skizze8 → Schnitt-Linear austragen4 (cut, through all)
    with BuildSketch(Plane.XY.offset(1.5)):
        with Locations((-49.5, 0)):
            Circle(SKIZZE8_R)
        with Locations((-39.5, 0)):
            Circle(SKIZZE8_R)
    extrude(amount=-SCHNITT_LINEAR_AUSTRAGEN4_DEPTH, mode=Mode.SUBTRACT)


solid = body_2_1.part
